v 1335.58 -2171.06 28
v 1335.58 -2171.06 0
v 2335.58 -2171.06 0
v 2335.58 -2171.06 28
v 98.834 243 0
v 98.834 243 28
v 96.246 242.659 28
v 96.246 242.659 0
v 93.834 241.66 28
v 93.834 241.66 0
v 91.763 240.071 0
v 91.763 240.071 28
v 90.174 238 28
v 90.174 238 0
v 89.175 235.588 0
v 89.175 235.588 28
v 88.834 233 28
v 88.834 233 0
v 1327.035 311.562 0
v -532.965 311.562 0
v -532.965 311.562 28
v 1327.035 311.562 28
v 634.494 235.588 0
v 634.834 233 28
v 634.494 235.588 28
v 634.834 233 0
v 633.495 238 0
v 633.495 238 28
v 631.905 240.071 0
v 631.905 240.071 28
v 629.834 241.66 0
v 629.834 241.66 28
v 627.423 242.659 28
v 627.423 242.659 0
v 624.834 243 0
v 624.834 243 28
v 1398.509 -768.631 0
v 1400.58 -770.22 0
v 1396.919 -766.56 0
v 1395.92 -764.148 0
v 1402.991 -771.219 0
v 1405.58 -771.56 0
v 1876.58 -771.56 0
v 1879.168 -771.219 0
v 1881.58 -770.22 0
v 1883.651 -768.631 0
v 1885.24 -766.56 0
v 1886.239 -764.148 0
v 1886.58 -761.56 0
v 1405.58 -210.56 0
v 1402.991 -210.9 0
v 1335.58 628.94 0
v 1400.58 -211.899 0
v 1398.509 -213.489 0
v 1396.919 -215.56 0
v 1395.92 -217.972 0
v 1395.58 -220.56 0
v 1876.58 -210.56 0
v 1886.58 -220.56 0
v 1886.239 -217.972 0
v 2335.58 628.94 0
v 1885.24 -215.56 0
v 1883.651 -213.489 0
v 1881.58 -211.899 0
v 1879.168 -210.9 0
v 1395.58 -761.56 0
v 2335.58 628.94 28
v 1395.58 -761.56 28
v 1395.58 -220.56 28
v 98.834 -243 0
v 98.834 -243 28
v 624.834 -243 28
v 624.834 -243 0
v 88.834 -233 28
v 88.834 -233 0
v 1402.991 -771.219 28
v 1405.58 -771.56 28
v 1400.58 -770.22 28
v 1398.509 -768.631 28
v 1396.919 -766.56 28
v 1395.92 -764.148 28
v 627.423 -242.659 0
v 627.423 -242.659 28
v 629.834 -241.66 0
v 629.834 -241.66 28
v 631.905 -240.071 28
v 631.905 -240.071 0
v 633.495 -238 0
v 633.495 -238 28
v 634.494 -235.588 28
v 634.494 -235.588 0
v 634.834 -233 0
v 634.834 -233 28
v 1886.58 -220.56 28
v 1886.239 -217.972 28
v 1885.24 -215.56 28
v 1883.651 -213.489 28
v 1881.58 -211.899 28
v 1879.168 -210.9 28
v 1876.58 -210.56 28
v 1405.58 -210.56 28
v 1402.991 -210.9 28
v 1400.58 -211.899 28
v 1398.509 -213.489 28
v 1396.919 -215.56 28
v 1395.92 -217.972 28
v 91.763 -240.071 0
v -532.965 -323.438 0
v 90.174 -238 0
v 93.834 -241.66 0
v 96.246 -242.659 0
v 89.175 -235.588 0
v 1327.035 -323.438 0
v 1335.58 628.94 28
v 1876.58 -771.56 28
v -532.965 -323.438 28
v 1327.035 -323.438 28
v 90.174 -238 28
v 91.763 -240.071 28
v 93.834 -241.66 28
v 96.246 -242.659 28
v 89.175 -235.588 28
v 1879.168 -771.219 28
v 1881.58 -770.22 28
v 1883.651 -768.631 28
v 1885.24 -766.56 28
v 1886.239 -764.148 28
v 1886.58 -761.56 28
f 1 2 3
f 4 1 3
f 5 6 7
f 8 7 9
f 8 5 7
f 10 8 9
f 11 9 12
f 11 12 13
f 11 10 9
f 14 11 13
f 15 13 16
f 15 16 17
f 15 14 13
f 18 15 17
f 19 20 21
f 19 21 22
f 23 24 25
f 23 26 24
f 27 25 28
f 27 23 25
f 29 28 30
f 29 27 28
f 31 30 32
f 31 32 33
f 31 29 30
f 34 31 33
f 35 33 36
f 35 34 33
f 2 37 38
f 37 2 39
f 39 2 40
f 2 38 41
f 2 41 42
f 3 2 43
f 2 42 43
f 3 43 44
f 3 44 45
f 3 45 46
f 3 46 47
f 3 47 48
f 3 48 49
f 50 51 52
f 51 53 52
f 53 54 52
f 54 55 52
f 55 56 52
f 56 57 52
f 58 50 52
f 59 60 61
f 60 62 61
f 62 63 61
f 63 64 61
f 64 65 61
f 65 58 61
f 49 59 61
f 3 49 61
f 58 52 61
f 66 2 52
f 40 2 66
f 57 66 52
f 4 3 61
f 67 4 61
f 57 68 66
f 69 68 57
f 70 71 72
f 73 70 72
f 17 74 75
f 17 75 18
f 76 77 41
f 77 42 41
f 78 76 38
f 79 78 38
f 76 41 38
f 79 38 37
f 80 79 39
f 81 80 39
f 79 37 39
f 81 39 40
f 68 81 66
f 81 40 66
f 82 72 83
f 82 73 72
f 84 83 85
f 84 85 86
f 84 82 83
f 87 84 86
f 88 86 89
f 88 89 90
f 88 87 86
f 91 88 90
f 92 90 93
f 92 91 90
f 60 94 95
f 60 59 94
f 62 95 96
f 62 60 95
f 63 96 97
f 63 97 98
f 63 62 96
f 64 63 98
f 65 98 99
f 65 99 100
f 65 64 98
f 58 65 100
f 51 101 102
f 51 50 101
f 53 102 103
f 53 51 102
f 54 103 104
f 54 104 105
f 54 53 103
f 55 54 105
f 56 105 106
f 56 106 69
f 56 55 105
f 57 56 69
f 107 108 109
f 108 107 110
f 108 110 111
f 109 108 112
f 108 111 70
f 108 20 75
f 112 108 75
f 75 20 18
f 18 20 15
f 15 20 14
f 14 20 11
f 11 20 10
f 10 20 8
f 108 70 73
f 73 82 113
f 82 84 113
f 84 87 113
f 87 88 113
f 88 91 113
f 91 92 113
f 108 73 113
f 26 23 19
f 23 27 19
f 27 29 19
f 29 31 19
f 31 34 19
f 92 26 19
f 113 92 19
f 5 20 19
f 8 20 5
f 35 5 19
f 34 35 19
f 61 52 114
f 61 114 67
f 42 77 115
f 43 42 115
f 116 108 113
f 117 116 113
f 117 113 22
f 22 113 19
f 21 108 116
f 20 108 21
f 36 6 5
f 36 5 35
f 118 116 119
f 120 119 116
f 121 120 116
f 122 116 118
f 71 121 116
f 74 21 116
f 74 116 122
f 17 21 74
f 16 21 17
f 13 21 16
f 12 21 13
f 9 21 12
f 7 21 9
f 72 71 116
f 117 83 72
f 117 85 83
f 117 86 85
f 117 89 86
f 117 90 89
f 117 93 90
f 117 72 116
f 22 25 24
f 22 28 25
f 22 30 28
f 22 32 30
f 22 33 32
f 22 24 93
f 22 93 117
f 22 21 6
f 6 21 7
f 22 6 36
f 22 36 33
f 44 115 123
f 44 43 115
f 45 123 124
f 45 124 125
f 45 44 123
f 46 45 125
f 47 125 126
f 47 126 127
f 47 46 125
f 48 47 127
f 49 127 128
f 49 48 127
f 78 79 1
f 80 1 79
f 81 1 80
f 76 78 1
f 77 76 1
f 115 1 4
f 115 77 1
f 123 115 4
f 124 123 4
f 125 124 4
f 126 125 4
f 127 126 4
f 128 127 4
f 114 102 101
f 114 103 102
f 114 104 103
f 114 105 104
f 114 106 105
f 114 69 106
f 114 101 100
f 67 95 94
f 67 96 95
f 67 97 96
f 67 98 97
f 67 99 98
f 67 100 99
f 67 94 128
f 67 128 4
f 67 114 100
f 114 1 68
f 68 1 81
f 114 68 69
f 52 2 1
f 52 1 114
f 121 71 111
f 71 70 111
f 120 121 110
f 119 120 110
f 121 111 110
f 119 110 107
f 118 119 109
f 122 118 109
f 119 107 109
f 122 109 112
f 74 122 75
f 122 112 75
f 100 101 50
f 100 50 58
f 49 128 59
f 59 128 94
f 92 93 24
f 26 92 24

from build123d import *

# Parameters (mm, degrees)
F0_W     = 1860
F0_H     = 635
F1_DEPTH = 28
F2_W     = 1000
F2_H     = 2800
F3_DEPTH = 28
F4_W     = 546
F4_H     = 486
F5_DEPTH = 28.001
F6_R     = 10
F7_W     = 491
F7_H     = 561
F8_DEPTH = 28.001
F9_R     = 10


with BuildPart() as f1:
    # F0 (on Top) → F1 (new body)
    with BuildSketch(Plane.XY):
        with Locations((397.0349, -5.937561)):
            Rectangle(F0_W, F0_H)
    extrude(amount=F1_DEPTH)

    # F4 (on face) → F5 (cut, through all)
    with BuildSketch(Plane.XY.offset(28)):
        with Locations((361.834347, 0)):
            Rectangle(F4_W, F4_H)
    extrude(amount=-F5_DEPTH, mode=Mode.SUBTRACT)

    # F6
    f6_edges = [f1.edges().sort_by_distance(p)[0] for p in [
        (634.834347, 243, 14),
        (88.834347, -243, 14),
        (634.834347, -243, 14),
        (88.834347, 243, 14),
    ]]
    fillet(f6_edges, radius=F6_R)


with BuildPart() as f3:
    # F2 (on Top) → F3 (new body)
    with BuildSketch(Plane.XY):
        with Locations((1835.579574, -771.059727)):
            Rectangle(F2_W, F2_H)
    extrude(amount=F3_DEPTH)

    # F7 (on face) → F8 (cut, through all)
    with BuildSketch(Plane.XY.offset(28)):
        with Locations((1641.079574, -491.059727)):
            Rectangle(F7_W, F7_H)
    extrude(amount=-F8_DEPTH, mode=Mode.SUBTRACT)

    # F9
    f9_edges = [f3.edges().sort_by_distance(p)[0] for p in [
        (1395.579574, -210.559727, 14),
        (1886.579574, -210.559727, 14),
        (1395.579574, -771.559727, 14),
        (1886.579574, -771.559727, 14),
    ]]
    fillet(f9_edges, radius=F9_R)


solid = Compound([f1.part, f3.part])
